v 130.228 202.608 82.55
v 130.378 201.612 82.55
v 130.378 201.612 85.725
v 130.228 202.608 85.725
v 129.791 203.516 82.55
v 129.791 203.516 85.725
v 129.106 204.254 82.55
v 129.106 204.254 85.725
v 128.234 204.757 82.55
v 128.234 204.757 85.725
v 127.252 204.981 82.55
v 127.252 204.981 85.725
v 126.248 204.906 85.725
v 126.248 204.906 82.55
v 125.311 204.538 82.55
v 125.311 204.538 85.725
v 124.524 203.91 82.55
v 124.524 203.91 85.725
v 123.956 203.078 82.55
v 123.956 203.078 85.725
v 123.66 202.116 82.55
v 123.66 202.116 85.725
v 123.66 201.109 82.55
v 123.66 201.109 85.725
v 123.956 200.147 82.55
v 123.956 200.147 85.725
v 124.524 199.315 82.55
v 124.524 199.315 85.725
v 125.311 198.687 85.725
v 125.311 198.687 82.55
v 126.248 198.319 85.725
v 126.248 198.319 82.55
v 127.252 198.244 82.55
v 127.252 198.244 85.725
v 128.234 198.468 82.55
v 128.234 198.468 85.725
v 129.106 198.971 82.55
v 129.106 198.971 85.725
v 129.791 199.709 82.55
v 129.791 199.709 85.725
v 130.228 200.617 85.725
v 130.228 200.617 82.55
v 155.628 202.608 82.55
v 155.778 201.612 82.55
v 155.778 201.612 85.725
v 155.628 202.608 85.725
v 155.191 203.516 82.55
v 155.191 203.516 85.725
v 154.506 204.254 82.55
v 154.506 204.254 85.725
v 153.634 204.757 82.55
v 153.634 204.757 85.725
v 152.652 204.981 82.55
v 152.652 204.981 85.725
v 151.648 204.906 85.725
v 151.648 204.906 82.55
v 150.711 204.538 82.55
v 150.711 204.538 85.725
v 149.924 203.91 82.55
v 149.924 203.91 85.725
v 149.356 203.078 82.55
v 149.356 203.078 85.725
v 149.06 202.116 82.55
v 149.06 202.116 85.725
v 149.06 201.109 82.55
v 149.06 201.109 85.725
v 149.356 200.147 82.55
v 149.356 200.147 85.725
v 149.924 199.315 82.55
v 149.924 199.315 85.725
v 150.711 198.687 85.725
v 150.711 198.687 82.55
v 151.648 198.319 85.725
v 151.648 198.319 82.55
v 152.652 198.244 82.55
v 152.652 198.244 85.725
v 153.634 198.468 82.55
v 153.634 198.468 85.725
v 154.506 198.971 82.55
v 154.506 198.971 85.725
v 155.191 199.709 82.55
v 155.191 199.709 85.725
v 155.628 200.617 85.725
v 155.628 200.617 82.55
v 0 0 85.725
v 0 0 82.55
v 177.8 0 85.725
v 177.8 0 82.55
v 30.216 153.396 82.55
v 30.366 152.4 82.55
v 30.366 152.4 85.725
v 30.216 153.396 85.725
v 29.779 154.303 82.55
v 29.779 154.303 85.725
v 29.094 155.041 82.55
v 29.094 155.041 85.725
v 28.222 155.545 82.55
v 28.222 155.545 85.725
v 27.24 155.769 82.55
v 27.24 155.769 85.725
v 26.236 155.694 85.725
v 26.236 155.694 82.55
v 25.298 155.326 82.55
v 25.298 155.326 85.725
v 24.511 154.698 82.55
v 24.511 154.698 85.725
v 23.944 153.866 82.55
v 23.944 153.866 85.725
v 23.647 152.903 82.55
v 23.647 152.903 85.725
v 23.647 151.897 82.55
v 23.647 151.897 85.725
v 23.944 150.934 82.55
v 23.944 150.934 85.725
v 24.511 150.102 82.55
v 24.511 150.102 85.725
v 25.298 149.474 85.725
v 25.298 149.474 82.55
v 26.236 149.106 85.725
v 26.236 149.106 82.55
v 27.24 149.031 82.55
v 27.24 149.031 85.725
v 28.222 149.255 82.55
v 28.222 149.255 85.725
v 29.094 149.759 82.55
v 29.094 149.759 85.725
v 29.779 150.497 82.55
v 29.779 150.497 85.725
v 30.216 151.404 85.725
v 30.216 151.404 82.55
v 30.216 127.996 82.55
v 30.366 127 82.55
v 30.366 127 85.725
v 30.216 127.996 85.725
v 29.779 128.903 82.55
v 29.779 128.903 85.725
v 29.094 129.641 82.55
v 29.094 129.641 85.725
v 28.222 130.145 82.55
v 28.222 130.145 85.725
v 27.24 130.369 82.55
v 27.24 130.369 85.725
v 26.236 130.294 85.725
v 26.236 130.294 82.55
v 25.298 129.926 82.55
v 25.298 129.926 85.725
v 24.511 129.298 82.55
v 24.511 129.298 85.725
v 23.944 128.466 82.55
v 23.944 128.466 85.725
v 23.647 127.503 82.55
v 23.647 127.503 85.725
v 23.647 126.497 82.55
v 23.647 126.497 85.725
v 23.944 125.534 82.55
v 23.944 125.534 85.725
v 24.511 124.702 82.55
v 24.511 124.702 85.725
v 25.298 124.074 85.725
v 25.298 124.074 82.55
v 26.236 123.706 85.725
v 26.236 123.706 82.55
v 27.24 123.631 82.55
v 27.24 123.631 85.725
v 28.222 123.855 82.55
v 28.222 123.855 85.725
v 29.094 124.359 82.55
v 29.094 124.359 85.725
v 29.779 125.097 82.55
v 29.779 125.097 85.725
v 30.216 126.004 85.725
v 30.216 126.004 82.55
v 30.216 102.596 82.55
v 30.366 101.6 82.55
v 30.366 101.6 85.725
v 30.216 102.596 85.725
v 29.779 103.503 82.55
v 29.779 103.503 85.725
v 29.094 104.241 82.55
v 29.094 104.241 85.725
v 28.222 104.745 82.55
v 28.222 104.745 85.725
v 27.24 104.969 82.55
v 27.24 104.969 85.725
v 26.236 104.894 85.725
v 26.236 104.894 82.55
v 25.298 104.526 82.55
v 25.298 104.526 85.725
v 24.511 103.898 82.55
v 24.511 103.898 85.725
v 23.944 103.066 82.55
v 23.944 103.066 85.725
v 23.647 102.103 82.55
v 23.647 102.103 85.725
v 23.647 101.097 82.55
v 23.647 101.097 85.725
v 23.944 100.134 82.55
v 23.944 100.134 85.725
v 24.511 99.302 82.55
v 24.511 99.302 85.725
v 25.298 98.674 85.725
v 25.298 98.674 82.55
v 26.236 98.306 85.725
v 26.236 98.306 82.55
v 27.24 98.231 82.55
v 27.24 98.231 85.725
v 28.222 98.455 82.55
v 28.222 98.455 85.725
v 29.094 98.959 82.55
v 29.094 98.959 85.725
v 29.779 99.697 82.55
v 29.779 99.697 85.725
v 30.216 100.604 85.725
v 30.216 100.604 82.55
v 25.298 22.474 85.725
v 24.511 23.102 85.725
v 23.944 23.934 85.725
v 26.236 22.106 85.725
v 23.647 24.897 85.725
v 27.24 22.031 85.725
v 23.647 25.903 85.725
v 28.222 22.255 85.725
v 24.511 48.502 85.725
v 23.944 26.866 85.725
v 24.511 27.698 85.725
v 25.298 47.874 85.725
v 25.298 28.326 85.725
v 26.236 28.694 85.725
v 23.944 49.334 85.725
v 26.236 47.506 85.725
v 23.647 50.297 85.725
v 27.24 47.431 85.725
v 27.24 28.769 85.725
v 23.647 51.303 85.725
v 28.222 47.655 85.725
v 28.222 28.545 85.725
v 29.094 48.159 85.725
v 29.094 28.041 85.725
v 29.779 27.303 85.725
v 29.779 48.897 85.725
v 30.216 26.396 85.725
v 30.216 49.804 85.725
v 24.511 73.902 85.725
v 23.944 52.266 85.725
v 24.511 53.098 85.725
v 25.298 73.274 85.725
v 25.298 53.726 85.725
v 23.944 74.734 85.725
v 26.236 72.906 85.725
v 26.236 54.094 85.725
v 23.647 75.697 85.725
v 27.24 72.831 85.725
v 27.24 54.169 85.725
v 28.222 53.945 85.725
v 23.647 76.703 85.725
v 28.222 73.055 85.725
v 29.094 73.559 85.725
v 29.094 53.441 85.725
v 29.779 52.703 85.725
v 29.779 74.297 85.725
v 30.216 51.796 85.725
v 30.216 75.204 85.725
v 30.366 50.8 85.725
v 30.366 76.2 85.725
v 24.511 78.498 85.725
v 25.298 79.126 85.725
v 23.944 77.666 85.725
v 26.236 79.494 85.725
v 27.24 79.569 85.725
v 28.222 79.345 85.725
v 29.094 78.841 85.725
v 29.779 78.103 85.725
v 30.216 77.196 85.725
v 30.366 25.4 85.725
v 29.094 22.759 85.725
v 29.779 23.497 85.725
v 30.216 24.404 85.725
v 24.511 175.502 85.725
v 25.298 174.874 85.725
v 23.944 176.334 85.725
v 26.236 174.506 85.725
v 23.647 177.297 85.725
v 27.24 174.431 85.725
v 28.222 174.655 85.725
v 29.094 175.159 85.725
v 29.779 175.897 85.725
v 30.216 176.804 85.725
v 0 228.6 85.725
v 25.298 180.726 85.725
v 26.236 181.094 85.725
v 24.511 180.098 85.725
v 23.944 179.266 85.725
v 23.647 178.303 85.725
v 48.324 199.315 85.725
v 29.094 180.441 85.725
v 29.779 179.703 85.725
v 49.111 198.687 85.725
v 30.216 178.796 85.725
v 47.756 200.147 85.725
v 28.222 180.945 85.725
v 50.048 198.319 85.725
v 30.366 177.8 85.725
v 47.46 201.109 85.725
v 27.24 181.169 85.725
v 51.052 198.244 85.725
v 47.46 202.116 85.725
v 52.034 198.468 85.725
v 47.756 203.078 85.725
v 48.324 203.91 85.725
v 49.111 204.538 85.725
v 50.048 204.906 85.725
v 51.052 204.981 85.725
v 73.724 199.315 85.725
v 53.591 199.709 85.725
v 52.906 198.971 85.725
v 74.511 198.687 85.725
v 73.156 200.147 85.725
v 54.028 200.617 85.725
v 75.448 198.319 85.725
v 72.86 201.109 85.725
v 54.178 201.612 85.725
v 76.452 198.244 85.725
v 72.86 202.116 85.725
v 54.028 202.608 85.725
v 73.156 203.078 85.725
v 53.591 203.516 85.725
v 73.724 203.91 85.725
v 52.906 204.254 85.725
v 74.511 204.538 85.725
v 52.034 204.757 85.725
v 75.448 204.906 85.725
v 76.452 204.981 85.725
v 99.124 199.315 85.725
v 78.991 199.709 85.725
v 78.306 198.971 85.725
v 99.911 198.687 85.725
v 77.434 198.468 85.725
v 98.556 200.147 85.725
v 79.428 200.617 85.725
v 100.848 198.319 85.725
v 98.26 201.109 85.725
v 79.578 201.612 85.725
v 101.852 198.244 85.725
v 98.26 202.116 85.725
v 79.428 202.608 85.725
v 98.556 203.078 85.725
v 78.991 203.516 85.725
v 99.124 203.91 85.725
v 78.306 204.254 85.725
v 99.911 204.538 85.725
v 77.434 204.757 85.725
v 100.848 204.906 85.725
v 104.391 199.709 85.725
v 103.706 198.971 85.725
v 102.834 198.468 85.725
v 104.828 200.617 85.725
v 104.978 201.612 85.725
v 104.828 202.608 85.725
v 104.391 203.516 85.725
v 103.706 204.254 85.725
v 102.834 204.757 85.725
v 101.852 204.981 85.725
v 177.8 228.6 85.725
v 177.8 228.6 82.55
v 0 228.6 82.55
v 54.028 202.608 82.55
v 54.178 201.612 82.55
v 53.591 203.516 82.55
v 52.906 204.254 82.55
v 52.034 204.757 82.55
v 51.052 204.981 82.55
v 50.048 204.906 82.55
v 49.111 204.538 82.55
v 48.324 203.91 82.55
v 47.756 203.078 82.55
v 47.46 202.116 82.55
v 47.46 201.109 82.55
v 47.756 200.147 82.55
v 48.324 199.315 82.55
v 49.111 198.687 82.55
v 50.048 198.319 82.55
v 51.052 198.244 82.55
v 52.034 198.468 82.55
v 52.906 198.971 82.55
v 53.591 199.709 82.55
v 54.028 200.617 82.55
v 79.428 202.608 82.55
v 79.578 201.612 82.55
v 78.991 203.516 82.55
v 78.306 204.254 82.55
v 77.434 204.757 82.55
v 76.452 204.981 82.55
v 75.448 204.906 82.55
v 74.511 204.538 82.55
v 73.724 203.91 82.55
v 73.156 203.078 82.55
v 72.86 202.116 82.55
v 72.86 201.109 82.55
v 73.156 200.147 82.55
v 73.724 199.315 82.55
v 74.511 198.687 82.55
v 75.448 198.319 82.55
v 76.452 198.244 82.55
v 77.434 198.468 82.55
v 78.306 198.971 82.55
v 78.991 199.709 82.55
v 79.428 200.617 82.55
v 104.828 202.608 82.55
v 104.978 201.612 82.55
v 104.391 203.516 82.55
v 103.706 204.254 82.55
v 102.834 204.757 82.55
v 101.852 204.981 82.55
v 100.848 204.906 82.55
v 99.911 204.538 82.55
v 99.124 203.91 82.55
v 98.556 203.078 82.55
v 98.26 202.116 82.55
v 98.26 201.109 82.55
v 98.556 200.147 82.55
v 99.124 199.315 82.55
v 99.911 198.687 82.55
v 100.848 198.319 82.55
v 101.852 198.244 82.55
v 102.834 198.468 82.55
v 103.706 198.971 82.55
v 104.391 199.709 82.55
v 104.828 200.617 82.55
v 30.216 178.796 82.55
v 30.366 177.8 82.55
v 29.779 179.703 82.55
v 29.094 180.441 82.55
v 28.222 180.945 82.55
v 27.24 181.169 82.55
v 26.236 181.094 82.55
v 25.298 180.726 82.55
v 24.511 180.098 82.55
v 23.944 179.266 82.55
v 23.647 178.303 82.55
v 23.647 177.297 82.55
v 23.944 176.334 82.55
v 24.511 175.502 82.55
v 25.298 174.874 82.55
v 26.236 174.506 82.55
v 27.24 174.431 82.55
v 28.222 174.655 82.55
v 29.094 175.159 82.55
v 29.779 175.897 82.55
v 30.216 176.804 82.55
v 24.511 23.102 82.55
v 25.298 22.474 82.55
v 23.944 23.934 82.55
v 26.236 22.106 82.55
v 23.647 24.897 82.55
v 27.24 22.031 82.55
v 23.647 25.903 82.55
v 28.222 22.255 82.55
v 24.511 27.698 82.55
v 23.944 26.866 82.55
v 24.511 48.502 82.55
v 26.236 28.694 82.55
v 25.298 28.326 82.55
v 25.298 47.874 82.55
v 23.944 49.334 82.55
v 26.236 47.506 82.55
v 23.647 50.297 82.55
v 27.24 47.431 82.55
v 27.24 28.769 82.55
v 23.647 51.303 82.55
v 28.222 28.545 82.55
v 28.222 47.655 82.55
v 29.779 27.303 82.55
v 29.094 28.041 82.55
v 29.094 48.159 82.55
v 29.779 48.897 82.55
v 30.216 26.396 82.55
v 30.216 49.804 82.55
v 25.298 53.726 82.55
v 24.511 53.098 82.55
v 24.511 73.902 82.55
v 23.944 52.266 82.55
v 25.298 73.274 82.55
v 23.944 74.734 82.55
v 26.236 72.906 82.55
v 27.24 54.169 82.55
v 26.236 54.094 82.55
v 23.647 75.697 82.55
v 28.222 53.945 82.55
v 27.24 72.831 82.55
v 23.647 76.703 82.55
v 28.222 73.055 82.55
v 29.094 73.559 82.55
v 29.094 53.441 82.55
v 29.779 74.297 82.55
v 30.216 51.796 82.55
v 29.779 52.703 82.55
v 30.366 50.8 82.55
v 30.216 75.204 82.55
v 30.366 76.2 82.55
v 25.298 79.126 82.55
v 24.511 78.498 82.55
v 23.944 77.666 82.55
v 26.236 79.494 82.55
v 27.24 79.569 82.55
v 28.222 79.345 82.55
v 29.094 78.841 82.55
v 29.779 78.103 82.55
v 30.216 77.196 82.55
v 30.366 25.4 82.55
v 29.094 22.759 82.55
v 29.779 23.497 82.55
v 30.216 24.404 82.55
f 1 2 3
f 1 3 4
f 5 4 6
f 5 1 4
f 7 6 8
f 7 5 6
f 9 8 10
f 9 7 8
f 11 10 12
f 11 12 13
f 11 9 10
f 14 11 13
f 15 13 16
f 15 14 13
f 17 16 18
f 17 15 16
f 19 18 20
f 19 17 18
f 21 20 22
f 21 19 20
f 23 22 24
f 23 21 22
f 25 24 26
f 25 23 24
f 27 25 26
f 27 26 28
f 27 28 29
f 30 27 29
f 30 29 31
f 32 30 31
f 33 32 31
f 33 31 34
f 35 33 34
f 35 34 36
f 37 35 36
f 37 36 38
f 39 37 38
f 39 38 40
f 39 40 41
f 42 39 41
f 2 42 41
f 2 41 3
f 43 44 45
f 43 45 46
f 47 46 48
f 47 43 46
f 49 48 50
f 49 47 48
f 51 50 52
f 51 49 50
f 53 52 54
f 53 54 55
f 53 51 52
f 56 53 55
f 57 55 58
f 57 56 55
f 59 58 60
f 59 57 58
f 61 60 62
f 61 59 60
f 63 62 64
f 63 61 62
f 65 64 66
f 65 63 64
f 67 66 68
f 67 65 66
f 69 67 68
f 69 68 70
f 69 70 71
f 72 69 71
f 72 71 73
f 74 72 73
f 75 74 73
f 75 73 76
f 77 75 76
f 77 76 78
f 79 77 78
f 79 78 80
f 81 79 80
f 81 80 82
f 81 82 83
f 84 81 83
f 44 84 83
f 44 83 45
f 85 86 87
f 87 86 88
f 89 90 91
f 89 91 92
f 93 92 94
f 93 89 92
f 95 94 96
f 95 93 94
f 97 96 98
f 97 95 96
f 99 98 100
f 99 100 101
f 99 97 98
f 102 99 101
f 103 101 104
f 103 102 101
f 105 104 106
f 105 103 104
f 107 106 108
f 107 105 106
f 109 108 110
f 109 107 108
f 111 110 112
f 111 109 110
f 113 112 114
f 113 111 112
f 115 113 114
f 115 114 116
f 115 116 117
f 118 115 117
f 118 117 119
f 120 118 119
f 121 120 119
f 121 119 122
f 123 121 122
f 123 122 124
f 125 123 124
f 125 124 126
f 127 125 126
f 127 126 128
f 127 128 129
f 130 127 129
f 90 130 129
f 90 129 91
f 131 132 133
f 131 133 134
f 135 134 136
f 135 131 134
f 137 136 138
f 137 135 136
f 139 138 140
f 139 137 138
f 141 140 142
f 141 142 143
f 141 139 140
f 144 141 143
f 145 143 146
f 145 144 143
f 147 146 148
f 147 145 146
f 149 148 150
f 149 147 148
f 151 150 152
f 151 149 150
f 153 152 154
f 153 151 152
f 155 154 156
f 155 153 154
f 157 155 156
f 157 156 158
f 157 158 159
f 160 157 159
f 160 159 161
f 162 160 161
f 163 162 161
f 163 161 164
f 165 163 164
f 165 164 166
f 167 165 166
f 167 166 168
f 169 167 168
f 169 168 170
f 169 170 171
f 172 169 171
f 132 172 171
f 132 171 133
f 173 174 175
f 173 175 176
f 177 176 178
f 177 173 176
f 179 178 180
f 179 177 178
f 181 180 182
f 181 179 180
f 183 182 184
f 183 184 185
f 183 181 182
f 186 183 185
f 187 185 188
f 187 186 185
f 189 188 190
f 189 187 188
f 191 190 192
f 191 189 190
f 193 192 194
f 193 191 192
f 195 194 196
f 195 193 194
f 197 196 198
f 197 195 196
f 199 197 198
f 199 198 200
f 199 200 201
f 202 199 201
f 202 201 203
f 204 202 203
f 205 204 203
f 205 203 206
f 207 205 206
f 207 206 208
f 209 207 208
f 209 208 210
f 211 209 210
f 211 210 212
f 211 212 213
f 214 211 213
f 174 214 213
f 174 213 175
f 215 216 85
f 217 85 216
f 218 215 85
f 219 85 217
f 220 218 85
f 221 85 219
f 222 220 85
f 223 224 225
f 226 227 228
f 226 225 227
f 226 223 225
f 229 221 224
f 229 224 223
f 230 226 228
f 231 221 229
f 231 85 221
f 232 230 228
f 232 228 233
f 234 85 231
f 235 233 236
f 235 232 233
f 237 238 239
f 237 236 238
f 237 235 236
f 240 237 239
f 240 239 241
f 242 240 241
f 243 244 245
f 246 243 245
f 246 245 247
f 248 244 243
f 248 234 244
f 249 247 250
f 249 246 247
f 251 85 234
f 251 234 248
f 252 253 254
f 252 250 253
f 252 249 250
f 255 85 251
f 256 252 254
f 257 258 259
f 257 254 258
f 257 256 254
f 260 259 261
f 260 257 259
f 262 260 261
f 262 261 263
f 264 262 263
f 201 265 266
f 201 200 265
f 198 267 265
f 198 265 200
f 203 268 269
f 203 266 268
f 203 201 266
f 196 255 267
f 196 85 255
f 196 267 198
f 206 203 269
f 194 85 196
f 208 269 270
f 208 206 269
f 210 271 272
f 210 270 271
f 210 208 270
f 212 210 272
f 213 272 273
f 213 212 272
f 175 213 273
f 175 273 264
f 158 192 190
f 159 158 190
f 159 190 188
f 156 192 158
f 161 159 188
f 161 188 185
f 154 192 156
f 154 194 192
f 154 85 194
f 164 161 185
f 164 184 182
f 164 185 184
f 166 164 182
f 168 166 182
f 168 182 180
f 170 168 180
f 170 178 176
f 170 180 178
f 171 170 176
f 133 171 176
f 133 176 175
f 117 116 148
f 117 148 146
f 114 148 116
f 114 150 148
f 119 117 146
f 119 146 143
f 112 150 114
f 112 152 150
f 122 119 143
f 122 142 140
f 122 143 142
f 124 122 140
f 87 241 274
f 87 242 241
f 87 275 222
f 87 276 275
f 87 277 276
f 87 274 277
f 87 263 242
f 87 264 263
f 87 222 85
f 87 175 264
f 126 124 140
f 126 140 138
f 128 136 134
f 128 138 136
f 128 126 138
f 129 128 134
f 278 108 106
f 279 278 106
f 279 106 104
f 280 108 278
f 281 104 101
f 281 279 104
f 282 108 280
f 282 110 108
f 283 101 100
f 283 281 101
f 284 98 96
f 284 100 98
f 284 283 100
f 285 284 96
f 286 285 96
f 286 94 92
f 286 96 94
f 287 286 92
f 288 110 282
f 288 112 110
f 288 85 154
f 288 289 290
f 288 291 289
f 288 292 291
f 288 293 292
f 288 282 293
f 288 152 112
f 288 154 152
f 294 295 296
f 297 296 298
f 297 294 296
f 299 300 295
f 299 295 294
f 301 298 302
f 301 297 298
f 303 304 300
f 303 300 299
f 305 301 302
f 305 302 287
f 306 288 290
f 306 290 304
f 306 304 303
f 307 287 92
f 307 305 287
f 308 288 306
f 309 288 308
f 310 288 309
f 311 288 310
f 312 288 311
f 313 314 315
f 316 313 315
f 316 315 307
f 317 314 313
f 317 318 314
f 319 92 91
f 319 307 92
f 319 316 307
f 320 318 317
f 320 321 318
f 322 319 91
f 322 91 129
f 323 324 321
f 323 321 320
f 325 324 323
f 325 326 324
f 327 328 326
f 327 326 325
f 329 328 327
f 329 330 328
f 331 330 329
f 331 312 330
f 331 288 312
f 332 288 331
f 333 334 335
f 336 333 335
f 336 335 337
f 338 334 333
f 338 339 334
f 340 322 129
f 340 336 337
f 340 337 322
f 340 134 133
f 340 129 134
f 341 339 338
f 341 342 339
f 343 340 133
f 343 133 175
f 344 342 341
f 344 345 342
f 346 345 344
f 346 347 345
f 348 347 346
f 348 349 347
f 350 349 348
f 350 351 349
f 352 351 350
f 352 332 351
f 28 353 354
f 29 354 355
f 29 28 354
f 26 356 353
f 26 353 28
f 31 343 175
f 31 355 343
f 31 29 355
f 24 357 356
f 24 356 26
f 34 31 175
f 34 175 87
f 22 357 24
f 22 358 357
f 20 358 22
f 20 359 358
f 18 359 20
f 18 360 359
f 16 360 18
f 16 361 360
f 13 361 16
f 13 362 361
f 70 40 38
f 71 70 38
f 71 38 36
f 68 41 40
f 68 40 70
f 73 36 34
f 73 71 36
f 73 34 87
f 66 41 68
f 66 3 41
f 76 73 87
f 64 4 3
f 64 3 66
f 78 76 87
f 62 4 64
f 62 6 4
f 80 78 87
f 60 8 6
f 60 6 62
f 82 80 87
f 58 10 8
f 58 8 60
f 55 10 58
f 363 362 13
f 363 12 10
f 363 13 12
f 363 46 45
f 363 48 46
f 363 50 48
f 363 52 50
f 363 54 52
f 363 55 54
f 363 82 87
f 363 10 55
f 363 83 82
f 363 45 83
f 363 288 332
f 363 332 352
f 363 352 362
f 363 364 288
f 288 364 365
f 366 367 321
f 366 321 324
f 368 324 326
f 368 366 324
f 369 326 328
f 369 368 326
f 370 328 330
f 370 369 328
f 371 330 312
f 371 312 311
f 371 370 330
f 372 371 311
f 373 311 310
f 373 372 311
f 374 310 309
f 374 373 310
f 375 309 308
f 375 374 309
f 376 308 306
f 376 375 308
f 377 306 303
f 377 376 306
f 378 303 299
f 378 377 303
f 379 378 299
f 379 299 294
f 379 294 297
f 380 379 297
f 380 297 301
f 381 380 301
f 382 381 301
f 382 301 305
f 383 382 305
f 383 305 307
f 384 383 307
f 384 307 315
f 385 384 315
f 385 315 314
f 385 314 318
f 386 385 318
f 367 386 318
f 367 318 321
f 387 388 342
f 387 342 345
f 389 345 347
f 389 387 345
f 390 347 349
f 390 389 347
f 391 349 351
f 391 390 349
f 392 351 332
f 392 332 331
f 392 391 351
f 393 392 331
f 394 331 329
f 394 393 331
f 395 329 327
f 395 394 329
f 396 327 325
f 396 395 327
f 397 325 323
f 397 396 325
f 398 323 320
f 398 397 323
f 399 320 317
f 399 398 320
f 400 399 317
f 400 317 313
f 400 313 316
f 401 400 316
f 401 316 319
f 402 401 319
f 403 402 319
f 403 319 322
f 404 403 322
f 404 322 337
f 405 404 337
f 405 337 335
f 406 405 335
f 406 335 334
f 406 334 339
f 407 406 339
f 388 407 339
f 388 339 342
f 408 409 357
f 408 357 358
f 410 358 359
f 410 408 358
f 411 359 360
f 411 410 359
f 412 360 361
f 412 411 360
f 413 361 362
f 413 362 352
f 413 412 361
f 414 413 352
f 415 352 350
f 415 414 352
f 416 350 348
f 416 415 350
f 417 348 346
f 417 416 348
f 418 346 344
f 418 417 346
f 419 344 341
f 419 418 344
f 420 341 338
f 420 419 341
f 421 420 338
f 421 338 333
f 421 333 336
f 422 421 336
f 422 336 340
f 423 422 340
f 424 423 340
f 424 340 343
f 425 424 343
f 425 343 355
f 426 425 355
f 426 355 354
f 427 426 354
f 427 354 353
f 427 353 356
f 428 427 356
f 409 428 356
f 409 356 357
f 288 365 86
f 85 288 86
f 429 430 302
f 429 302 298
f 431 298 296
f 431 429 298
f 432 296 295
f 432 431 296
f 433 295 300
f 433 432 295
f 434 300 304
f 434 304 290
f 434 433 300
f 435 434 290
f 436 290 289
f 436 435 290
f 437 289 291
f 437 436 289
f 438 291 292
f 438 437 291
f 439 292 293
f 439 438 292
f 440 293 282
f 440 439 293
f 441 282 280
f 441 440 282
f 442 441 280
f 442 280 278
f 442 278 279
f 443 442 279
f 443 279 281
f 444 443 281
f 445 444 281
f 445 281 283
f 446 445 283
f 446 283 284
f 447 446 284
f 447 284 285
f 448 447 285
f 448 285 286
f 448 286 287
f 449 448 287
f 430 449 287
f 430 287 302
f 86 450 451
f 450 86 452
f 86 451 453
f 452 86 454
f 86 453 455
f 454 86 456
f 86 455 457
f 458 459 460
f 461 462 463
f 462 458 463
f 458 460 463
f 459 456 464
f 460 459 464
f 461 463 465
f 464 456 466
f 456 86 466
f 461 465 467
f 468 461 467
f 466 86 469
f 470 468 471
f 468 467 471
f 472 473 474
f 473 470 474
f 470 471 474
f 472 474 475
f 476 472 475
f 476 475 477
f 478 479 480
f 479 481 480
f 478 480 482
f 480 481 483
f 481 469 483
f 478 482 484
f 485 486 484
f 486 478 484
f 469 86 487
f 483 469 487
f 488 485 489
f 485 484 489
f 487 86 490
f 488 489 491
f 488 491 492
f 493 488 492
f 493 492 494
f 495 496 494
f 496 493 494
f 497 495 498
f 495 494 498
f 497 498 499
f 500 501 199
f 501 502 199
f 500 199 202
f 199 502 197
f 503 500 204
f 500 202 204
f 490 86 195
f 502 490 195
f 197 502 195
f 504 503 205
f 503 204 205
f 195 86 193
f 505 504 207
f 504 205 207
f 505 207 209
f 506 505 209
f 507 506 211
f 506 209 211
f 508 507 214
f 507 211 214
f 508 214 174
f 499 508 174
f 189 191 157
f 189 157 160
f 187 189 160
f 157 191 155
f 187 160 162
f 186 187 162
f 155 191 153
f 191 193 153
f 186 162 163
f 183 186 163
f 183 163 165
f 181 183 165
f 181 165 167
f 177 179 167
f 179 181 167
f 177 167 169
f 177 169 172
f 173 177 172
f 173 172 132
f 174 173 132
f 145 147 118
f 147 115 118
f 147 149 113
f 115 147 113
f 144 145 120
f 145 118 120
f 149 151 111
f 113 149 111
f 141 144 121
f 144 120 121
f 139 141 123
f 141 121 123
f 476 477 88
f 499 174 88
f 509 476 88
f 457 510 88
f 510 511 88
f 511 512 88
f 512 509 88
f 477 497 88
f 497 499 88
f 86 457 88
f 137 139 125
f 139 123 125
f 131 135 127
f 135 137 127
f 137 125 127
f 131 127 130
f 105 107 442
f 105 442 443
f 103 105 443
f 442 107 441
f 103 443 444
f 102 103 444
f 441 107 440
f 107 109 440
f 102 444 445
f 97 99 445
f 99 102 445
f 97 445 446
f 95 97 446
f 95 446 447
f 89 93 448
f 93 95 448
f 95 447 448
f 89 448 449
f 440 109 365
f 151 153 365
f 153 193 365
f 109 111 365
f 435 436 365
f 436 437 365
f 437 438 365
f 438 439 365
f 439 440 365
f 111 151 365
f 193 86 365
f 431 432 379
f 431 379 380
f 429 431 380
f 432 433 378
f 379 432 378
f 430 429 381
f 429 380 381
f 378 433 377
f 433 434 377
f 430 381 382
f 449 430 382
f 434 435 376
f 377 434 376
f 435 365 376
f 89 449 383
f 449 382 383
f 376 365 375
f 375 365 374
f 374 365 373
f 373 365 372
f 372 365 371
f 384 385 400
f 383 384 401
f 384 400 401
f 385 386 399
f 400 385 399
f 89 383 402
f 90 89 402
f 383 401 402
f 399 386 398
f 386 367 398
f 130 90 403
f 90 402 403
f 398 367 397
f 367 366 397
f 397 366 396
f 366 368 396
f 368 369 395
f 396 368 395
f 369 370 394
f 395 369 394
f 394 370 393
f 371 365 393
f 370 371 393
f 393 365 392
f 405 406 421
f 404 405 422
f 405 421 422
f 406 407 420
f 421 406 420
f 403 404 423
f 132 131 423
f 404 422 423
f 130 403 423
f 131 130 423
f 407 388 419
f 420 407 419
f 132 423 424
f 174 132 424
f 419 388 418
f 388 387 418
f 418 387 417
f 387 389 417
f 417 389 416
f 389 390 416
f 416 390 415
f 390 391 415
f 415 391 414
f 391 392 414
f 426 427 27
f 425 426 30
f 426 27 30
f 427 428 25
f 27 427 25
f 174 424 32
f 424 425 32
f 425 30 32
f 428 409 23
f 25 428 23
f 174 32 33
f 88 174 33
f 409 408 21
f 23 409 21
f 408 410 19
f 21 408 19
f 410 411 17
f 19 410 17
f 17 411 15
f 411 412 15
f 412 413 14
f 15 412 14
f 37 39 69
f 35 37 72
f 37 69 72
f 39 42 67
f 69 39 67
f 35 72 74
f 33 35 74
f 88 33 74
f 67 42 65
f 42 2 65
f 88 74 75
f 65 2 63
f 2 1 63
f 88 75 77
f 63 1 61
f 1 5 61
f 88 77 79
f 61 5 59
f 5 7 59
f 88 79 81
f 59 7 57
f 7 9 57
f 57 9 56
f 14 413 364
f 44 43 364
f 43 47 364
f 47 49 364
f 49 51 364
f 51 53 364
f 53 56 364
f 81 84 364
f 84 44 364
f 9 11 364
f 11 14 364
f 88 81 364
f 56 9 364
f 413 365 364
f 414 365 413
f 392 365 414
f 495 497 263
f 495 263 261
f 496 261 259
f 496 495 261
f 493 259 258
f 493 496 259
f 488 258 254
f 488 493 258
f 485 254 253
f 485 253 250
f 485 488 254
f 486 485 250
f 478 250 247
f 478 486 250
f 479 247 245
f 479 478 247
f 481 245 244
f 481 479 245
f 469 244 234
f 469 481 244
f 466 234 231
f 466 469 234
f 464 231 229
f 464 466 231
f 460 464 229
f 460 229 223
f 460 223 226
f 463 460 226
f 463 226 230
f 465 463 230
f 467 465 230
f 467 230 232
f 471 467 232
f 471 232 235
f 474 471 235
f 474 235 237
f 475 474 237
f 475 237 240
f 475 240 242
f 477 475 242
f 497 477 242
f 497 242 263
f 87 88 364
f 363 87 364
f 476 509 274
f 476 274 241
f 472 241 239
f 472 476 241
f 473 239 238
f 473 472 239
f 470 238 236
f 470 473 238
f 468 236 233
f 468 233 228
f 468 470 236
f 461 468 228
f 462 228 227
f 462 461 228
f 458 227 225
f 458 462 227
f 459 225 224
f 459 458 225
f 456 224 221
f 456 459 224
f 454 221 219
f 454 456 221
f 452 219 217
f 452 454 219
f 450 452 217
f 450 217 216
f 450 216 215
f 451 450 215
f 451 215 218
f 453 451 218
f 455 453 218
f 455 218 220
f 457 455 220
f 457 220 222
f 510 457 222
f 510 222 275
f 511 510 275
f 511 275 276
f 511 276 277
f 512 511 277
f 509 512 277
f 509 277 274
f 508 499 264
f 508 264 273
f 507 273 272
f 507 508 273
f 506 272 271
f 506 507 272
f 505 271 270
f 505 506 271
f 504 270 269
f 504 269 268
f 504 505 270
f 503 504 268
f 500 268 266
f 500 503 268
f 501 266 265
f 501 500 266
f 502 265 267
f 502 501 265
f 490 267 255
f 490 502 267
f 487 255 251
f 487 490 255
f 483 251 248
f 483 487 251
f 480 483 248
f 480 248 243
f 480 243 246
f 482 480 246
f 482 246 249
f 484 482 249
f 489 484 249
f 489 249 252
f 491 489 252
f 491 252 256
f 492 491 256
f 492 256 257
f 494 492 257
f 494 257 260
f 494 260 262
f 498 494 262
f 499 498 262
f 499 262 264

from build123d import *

# Parameters (mm, degrees)
F0_W      = 50.8
F0_H      = 177.8
F1_DEPTH  = 3.175
F3_DEPTH  = 76.2
F5_DEPTH  = 3.175
F7_D      = 6.7564
F7_DEPTH  = 29.21
F7_TIP    = 2.0298273432
F8_W      = 127
F8_H      = 177.8
F8_R      = 3.3782
F9_DEPTH  = 3.175
F10_W     = 247.0957003534
F10_H     = 423.9609837532
F11_DEPTH = 82.55


# Not quite as in the source:
# - an extrude ends at something that could not be found from the text; its depth is read off the source's solid


with BuildPart() as f1:
    # F0 (on Top) → F1 (new body)
    with BuildSketch(Plane.XY):
        Polygon((0, 228.6), (0, 177.8), (50.8, 177.8), (177.8, 177.8), (177.8, 228.6), align=None)
        with Locations((25.4, 88.9)):
            Rectangle(F0_W, F0_H)
    extrude(amount=F1_DEPTH)

    # F2 (on face) → F3 (join)
    with BuildSketch(Plane.XY.offset(3.175)):
        Polygon((3.175, 0), (3.175, 225.425), (177.8, 225.425), (177.8, 228.6), (0, 228.6), (0, 0), align=None)
    extrude(amount=F3_DEPTH)

    # F4 (on face) → F5 (join)
    with BuildSketch(Plane.XY.offset(79.375)):
        Polygon((177.8, 228.6), (0, 228.6), (0, 0), (3.175, 0), (3.175, 225.425), (177.8, 225.425), align=None)
        Polygon((177.8, 177.8), (177.8, 225.425), (3.175, 225.425), (3.175, 0), (50.8, 0), (50.8, 177.8), align=None)
    extrude(amount=F5_DEPTH)

    # F7
    with Locations(Plane.XY.offset(82.55)):
        with Locations((26.9875, 25.4), (26.9875, 50.8), (26.9875, 76.2), (26.9875, 101.6), (26.9875, 127), (26.9875, 152.4), (26.9875, 177.8), (50.8, 201.6125), (76.2, 201.6125), (101.6, 201.6125), (127, 201.6125), (152.4, 201.6125)):
            Hole(F7_D / 2, depth=F7_DEPTH)
            with Locations((0, 0, -(F7_DEPTH + F7_TIP / 2))):  # 118° drill point
                Cone(0, F7_D / 2, F7_TIP, mode=Mode.SUBTRACT)

    # F8 (on face) → F9 (join)
    with BuildSketch(Plane.XY.offset(82.55)):
        with Locations((114.3, 88.9)):
            Rectangle(F8_W, F8_H)
        Polygon((0, 228.6), (0, 0), (50.8, 0), (50.8, 177.8), (177.8, 177.8), (177.8, 228.6), align=None)
        with Locations((26.9875, 25.4)):
            Circle(F8_R, mode=Mode.SUBTRACT)
        with Locations((26.9875, 50.8)):
            Circle(F8_R, mode=Mode.SUBTRACT)
        with Locations((26.9875, 76.2)):
            Circle(F8_R, mode=Mode.SUBTRACT)
        with Locations((26.9875, 101.6)):
            Circle(F8_R, mode=Mode.SUBTRACT)
        with Locations((26.9875, 127)):
            Circle(F8_R, mode=Mode.SUBTRACT)
        with Locations((26.9875, 152.4)):
            Circle(F8_R, mode=Mode.SUBTRACT)
        with Locations((26.9875, 177.8)):
            Circle(F8_R, mode=Mode.SUBTRACT)
        with Locations((50.8, 201.6125)):
            Circle(F8_R, mode=Mode.SUBTRACT)
        with Locations((76.2, 201.6125)):
            Circle(F8_R, mode=Mode.SUBTRACT)
        with Locations((101.6, 201.6125)):
            Circle(F8_R, mode=Mode.SUBTRACT)
        with Locations((127, 201.6125)):
            Circle(F8_R, mode=Mode.SUBTRACT)
        with Locations((152.4, 201.6125)):
            Circle(F8_R, mode=Mode.SUBTRACT)
    extrude(amount=F9_DEPTH)

    # F10 (on Top) → F11 (cut, through all)
    with BuildSketch(Plane.XY):
        with Locations((80.0526309758, 75.9060680866)):
            Rectangle(F10_W, F10_H)
    extrude(amount=F11_DEPTH, mode=Mode.SUBTRACT)


solid = f1.part
